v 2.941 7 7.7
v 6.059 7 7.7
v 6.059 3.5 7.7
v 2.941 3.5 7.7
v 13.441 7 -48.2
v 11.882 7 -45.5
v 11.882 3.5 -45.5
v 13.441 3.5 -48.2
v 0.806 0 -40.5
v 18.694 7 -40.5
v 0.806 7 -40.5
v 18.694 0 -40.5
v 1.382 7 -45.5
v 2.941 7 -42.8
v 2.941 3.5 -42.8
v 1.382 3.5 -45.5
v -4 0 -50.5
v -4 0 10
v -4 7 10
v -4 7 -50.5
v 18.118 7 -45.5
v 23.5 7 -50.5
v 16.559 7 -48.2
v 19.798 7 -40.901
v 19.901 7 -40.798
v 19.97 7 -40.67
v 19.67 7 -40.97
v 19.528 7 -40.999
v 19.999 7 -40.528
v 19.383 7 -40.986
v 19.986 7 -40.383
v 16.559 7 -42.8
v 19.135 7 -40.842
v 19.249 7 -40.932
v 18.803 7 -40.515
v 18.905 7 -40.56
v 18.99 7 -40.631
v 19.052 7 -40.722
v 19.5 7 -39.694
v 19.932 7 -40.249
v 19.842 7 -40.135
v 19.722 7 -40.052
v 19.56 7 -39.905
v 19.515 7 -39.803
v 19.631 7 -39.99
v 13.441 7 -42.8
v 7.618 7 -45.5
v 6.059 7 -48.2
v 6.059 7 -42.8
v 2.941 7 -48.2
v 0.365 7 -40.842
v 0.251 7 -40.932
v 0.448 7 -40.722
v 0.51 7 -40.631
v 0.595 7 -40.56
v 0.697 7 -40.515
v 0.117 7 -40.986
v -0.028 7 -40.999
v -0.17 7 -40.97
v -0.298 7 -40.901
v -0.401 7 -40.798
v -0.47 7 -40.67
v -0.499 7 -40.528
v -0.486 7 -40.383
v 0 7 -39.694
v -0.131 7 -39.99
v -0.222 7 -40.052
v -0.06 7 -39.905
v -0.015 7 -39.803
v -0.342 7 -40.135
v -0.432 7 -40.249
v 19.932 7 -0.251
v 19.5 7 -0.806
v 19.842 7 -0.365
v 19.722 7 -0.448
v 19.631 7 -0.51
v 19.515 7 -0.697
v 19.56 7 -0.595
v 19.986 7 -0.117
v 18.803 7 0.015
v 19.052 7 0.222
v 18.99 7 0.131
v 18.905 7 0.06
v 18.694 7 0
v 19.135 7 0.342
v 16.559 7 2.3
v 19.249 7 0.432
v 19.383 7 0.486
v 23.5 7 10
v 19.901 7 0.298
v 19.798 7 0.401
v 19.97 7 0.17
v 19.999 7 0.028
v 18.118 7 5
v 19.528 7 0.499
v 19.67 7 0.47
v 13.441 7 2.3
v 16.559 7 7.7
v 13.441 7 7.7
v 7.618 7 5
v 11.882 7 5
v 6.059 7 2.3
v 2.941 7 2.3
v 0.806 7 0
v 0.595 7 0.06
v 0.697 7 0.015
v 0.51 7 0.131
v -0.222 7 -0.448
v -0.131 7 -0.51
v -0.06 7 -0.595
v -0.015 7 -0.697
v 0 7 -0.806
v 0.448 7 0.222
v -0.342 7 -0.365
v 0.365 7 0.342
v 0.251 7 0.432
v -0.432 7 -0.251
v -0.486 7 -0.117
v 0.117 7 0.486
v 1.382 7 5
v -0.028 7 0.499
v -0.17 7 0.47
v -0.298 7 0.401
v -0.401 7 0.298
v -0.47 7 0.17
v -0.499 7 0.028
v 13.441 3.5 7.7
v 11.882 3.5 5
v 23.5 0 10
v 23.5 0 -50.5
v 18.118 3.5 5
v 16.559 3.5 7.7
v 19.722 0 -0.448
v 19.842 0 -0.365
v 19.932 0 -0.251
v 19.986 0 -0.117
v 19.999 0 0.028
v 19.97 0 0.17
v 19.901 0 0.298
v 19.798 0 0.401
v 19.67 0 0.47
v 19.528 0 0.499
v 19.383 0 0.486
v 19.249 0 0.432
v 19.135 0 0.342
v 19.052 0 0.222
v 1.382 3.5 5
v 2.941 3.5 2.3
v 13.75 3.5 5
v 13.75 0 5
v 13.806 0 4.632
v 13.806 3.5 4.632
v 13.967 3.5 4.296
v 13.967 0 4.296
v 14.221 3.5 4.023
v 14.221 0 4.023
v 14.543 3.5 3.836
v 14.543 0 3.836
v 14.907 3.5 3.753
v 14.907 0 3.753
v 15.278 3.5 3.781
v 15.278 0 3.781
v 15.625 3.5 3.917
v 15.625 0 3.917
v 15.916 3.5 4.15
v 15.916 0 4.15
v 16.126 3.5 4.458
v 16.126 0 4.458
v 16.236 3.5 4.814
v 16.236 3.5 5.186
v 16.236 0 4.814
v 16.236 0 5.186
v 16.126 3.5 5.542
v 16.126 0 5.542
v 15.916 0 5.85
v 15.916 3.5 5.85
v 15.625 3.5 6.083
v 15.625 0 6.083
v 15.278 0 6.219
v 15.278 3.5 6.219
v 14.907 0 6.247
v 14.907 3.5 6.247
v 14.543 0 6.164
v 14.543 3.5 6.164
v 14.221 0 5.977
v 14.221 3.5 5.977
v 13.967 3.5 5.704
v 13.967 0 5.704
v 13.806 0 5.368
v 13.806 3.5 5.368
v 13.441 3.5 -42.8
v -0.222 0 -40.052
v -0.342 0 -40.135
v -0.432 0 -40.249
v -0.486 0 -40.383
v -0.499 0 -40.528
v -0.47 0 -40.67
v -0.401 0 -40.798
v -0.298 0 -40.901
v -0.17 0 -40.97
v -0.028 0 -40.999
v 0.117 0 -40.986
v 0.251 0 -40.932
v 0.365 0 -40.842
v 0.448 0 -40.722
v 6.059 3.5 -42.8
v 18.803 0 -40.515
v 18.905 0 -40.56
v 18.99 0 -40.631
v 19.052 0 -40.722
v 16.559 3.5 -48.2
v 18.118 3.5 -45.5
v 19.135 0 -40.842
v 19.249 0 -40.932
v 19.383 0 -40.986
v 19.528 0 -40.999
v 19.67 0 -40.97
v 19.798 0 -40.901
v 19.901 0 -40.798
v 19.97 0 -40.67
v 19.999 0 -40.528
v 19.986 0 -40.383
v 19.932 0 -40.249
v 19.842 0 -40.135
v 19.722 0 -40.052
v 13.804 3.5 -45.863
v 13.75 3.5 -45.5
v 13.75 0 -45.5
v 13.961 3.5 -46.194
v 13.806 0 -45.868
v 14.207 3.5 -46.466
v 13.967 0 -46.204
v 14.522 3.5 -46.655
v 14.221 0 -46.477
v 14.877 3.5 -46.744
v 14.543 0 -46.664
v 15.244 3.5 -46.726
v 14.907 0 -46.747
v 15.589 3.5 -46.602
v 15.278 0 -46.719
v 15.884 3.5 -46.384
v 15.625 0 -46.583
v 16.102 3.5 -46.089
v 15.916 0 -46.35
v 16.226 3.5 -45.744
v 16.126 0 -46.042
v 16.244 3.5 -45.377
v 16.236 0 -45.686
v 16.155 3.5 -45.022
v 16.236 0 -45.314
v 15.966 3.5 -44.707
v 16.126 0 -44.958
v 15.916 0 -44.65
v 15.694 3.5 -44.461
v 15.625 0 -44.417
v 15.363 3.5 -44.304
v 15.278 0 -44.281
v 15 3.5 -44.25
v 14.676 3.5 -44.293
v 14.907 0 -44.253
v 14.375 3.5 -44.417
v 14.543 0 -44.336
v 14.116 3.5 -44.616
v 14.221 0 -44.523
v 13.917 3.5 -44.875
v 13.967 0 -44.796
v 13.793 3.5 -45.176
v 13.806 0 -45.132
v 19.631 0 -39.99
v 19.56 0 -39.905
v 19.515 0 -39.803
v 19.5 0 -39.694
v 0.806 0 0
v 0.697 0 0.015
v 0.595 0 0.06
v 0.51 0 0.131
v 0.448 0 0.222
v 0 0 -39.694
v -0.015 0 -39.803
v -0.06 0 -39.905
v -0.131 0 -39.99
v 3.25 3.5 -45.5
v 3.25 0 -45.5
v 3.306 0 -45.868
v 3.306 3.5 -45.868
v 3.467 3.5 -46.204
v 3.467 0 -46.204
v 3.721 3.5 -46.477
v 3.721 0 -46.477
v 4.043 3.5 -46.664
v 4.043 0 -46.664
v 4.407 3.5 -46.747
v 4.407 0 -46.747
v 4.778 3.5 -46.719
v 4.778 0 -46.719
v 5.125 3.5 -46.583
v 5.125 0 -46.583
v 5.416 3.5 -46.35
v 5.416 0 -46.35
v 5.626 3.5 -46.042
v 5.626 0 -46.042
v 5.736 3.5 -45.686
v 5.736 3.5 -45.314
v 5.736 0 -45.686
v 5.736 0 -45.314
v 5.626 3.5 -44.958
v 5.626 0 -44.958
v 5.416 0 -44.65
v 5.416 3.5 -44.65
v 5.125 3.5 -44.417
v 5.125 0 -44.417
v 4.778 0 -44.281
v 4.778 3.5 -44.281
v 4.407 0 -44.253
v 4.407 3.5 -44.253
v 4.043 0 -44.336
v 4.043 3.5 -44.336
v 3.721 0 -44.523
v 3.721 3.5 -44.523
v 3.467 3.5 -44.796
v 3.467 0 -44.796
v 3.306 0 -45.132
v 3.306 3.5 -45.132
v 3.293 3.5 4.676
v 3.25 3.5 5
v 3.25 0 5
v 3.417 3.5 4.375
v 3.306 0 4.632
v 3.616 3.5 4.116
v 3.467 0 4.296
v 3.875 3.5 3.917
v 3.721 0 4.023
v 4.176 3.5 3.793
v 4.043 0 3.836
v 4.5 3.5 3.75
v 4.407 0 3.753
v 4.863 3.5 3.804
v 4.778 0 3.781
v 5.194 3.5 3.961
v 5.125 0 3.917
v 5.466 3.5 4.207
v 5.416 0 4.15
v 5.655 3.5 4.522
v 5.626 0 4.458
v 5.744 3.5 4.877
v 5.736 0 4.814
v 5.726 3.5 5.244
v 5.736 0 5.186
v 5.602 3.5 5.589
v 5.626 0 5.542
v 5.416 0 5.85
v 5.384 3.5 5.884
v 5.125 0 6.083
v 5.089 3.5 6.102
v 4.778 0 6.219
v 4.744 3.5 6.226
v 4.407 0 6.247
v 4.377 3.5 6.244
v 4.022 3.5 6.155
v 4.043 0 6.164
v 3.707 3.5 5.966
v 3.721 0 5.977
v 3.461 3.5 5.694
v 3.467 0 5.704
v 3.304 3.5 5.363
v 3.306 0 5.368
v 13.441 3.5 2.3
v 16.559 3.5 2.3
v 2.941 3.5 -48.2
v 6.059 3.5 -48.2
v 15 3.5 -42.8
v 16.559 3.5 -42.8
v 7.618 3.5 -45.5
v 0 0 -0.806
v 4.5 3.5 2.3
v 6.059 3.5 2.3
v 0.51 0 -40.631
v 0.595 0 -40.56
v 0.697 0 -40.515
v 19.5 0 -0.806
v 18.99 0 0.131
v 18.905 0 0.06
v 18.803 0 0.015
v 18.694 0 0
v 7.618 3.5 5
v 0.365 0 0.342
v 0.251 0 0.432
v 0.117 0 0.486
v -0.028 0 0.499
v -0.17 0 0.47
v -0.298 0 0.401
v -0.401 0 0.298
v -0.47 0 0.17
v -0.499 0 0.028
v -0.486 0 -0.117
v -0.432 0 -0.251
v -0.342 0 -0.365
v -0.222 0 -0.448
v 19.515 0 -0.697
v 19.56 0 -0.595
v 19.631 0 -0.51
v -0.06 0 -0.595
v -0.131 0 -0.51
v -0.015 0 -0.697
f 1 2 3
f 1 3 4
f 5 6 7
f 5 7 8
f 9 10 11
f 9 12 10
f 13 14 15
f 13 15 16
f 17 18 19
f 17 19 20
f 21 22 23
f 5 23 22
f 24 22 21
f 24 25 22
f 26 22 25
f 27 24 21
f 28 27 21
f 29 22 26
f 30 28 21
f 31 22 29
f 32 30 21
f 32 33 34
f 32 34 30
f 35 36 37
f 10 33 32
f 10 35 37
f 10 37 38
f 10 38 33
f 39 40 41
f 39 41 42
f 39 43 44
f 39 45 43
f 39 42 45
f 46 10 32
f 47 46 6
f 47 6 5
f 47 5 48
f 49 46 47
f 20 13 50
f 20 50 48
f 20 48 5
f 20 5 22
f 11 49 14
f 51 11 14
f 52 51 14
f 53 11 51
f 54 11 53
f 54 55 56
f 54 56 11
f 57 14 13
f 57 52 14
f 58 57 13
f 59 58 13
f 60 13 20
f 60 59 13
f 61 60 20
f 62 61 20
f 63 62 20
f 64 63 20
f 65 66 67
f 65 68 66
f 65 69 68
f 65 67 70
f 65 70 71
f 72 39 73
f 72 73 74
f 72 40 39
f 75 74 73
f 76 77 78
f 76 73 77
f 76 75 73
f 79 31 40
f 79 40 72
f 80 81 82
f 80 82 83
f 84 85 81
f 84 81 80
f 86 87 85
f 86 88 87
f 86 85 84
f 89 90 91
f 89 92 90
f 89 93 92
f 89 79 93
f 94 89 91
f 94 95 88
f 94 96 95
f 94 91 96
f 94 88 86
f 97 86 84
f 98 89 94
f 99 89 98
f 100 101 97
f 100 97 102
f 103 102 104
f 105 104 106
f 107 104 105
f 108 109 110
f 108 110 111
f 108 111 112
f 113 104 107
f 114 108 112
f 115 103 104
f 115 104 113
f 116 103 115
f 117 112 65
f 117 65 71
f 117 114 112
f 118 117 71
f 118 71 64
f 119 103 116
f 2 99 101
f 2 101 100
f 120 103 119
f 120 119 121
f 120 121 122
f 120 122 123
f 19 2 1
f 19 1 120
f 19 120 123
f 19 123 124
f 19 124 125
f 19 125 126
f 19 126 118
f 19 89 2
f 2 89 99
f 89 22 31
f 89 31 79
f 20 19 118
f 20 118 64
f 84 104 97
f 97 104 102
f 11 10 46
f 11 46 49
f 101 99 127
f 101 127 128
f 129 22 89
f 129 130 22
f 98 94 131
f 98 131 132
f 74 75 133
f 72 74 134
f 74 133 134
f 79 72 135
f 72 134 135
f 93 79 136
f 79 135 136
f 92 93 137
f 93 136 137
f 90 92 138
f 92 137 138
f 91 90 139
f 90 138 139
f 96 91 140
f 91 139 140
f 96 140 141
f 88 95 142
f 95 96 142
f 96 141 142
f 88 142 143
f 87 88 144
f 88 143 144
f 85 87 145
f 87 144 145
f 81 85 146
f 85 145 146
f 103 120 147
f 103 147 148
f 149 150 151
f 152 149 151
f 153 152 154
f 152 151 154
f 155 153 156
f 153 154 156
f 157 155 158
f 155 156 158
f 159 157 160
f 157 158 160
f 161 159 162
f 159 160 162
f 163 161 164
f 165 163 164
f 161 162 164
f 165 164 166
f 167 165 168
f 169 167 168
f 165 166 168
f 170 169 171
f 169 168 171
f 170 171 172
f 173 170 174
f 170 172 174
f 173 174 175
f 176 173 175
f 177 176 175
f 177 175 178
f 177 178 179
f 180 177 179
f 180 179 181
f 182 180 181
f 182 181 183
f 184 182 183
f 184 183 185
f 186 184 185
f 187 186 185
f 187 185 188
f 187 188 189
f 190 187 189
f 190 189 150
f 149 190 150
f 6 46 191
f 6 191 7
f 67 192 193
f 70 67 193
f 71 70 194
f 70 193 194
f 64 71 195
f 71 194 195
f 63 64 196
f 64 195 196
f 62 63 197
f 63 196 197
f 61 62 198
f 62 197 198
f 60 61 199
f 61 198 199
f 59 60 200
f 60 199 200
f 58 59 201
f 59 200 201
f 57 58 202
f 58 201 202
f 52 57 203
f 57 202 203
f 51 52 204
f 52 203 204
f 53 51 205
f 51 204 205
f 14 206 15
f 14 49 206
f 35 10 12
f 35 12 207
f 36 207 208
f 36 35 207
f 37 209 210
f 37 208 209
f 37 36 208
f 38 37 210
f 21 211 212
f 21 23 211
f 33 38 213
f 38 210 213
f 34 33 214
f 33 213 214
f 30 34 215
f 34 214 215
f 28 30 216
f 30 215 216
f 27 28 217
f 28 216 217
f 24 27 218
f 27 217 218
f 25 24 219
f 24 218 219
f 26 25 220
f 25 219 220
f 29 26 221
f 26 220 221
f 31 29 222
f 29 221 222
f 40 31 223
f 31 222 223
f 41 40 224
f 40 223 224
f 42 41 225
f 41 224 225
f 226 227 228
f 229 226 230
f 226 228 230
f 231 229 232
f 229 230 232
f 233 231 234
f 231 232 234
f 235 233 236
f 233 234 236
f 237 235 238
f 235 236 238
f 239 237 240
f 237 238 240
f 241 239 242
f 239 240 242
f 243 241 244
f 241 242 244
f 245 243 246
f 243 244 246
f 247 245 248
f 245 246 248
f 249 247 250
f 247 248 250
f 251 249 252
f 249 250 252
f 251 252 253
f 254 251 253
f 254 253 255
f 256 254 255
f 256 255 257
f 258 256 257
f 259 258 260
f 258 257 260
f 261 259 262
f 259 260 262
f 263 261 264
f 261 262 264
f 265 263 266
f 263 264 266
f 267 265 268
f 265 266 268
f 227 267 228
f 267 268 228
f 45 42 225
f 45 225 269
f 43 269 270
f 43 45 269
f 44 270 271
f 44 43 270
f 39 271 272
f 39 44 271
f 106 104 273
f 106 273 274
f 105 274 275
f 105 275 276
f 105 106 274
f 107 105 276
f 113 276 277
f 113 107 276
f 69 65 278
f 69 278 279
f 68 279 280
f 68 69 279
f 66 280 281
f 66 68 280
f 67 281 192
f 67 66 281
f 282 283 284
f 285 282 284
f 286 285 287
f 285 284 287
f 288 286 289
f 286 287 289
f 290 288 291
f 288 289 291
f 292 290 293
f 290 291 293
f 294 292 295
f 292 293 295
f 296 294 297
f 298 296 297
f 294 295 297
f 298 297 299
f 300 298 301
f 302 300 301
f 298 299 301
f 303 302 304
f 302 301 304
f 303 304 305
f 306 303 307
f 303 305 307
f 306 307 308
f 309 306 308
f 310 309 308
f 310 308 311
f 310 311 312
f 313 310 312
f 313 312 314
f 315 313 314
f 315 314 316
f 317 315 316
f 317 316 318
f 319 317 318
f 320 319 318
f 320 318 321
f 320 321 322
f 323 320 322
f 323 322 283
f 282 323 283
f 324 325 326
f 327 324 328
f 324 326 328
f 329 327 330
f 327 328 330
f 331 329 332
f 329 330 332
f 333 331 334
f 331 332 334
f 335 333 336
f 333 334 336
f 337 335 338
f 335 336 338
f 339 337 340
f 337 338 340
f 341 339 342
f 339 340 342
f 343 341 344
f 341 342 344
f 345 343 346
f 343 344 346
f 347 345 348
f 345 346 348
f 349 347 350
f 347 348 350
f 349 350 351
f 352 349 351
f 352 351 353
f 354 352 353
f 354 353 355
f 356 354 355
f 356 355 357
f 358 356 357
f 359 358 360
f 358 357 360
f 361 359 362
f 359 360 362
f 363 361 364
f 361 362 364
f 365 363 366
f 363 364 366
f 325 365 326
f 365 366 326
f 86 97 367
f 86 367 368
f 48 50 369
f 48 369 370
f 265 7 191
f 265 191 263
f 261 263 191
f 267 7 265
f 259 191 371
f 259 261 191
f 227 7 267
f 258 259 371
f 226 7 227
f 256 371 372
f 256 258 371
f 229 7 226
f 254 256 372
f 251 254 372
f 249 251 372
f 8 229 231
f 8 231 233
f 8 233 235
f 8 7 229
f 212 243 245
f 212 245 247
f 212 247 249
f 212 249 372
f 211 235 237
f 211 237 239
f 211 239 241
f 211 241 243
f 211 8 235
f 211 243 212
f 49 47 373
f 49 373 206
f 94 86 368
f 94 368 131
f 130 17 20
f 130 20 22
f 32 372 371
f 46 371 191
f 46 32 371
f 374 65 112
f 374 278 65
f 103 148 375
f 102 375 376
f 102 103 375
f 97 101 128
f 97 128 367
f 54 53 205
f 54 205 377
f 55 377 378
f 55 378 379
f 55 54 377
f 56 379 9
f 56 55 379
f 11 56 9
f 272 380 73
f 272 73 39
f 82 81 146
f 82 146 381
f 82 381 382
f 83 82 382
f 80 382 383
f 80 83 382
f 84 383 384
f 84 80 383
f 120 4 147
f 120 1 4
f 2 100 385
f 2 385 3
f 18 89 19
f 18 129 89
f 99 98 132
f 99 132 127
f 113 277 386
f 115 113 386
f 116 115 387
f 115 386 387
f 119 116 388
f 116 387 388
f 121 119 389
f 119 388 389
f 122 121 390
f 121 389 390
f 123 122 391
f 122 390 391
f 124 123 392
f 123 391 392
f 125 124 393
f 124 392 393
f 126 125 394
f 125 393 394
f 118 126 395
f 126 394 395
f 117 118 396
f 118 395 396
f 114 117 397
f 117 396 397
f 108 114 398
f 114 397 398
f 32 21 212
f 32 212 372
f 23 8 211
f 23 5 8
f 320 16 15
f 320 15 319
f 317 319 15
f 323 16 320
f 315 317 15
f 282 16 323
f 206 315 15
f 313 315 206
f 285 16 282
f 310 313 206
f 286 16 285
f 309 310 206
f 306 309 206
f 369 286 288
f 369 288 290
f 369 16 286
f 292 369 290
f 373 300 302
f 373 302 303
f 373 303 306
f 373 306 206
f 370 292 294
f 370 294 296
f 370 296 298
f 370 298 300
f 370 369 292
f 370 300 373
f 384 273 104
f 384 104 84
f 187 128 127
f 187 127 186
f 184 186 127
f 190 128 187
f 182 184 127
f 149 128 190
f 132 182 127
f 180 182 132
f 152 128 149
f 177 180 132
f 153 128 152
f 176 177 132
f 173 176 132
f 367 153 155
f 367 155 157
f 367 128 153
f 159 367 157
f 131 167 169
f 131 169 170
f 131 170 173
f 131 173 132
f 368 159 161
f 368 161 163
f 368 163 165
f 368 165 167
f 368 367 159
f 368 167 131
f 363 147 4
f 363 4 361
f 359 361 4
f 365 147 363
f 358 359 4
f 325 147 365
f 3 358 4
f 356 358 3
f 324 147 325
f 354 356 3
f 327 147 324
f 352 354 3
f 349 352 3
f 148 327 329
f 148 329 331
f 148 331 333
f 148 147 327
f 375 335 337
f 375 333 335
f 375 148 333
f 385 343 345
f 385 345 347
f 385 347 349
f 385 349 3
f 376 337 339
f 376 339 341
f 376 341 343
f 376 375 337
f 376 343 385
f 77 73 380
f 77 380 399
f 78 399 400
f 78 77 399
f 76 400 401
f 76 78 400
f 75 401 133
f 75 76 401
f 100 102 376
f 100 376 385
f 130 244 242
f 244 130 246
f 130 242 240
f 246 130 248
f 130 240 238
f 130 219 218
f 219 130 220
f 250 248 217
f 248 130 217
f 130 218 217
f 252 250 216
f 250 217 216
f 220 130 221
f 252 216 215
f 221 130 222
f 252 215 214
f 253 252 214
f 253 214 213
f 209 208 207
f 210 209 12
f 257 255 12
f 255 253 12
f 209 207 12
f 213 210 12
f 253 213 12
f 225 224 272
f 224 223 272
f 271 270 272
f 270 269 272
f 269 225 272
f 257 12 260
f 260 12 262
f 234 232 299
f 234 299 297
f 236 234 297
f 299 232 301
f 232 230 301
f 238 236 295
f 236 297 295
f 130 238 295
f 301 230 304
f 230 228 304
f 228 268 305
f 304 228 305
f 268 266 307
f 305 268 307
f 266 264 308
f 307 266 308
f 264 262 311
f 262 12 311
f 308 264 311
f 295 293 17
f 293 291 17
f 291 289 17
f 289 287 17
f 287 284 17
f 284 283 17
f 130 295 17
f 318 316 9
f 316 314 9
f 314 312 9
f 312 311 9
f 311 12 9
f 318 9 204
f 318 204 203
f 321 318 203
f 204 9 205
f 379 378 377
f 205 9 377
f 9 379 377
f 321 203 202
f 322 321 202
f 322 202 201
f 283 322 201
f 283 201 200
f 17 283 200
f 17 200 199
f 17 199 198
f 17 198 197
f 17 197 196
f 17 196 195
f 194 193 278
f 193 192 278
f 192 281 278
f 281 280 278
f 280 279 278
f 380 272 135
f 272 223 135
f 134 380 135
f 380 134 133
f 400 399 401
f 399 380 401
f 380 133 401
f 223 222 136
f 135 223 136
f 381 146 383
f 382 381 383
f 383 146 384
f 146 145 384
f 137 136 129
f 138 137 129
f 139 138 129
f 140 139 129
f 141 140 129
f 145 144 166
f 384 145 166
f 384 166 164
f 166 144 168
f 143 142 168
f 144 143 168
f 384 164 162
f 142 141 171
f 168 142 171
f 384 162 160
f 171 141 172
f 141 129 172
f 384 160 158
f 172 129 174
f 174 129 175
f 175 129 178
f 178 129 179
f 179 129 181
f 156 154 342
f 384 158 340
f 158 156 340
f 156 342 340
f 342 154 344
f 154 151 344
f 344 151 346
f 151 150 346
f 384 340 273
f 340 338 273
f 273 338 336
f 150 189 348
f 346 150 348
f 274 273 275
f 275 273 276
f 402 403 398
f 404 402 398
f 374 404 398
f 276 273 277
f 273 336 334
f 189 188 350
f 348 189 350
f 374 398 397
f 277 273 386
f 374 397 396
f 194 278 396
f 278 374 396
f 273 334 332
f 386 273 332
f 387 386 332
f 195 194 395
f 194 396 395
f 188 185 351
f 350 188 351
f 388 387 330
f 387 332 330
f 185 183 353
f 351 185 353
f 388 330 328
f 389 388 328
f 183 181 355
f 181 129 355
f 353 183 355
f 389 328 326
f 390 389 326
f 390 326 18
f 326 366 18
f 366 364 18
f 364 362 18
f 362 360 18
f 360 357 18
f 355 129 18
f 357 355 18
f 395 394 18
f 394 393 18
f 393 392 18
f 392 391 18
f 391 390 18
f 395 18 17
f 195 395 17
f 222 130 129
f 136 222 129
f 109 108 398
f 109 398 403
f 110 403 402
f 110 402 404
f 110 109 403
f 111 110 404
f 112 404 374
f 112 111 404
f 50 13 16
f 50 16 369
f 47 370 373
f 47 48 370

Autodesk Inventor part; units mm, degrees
ref_plane "YZ Plane" through (0, 0, 0) normal (1, 0, 0) x (0, 1, 0)
ref_plane "XZ Plane" through (0, 0, 0) normal (0, 1, 0) x (-1, 0, 0)
ref_plane "XY Plane" through (0, 0, 0) normal (0, 0, 1) x (1, 0, 0)
sketch "Эскиз1" plane through (0, 0, 0) normal (0, 1, 0) x (-1, 0, 0)
  line L0 (0, 0) -> (-19.5, 0)
  line L1 (-19.5, 0) -> (-19.5, -40.5)
  line L2 (-19.5, -40.5) -> (0, -40.5)
  line L3 (0, -40.5) -> (0, 0)
  line L4 (-19.5, -40.5) -> (-19.5, -45.5)
  line L5 (-19.5, -45.5) -> (-15, -45.5)
  line L6 (0, -45.5) -> (-4.5, -45.5)
  line L7 (-4.5, -45.5) -> (-15, -45.5)
  line L8 (0, -40.5) -> (-19.5, -40.5)
  line L9 (-19.5, -40.5) -> (-19.5, -50.5)
  line L10 (-19.5, -50.5) -> (0, -50.5)
  line L11 (0, -50.5) -> (0, -40.5)
  line L12 (0, 0) -> (-19.5, 0)
  line L13 (-19.5, 0) -> (-19.5, 10)
  line L14 (-19.5, 10) -> (0, 10)
  line L15 (0, 10) -> (0, 0)
  line L16 (0, 5) -> (-4.5, 5)
  line L17 (-4.5, 5) -> (-15, 5)
  line L18 (-15, 5) -> (-19.5, 5)
  line L19 (-19.5, -50.5) -> (-23.5, -50.5)
  line L20 (-23.5, -50.5) -> (-23.5, 10)
  line L21 (-23.5, 10) -> (-19.5, 10)
  line L22 (-19.5, 10) -> (-19.5, -50.5)
  line L23 (0, 10) -> (4, 10)
  line L24 (4, 10) -> (4, -50.5)
  line L25 (4, -50.5) -> (0, -50.5)
  line L26 (0, -50.5) -> (0, 10)
  circle A0 centre (-4.5, -45.5) radius 1.25
  circle A1 centre (-15, -45.5) radius 1.25
  circle A2 centre (-4.5, 5) radius 1.25
  circle A3 centre (-15, 5) radius 1.25
  circle A4 centre (0, -40.5) radius 0.5
  circle A5 centre (-19.5, -40.5) radius 0.5
  circle A6 centre (0, 0) radius 0.5
  circle A7 centre (-19.5, 0) radius 0.5
  point P0 (-19, 0)
  point P1 (-0.5, 0)
  point P2 (0, -0.5)
  point P3 (0, -40)
  point P4 (-0.5, -40.5)
  point P5 (-19, -40.5)
  point P6 (-19.5, -40)
  point P7 (-19.5, -0.5)
  dimension "d0" = 19.5
  dimension "d1" = 40.5
  dimension "d2" = 5
  dimension "d3" = 4.5
  dimension "d4" = 4.5
  dimension "d5" = 10
  dimension "d6" = 10
  dimension "d7" = 4
  dimension "d8" = 4
  dimension "d9" = 2.5
  dimension "d10" = 2.5
  dimension "d11" = 2.5
  dimension "d12" = 2.5
  dimension "d16" = 1
  dimension "d17" = 1
  dimension "d18" = 1
  dimension "d19" = 1
extrude "Выдавливание1" add sketch "Эскиз1" along normal blind 7 contours A7 L13 L18 A3 L17 A2 L16 L15 A6 L0 | A7 L1 A5 L4 L9 L19 L20 L21 L13 | L15 L23 L24 L25 L11 A4 L3 A6 | L13 L14 L15 L16 A2 L17 A3 L18 | L2 A4 L11 L6 A0 L7 A1 L5 L4 A5 | L5 A1 L7 A0 L6 L11 L10 L9
fillet "Сопряжение1" radius 0.4 8 edges at (0, 3.5, -0.5) (0.5, 3.5, 0) (0, 3.5, -40) (0.5, 3.5, -40.5) (19.5, 3.5, -40) (19, 3.5, -40.5) (19.5, 3.5, -0.5) (19, 3.5, 0)
sketch "Эскиз2" plane through (0, 7, 0) normal (0, 1, 0) x (1, 0, 0)
  circle A0 centre (4.5, -5) radius 1.25 projected
  line L0 (4.5, -5) -> (4.5, -2.3)
  circle A1 centre (15, 45.5) radius 1.25 projected
  line L1 (15, 45.5) -> (15, 42.8)
  line L2 (13.4412, 42.8) -> (11.8823, 45.5)
  line L3 (11.8823, 45.5) -> (13.4412, 48.2)
  line L4 (13.4412, 48.2) -> (16.5588, 48.2)
  line L5 (16.5588, 48.2) -> (18.1177, 45.5)
  line L6 (18.1177, 45.5) -> (16.5588, 42.8)
  line L7 (16.5588, 42.8) -> (13.4412, 42.8)
  circle A2 centre (4.5, 45.5) radius 1.25 projected
  line L8 (2.9412, 42.8) -> (1.3823, 45.5)
  line L9 (1.3823, 45.5) -> (2.9412, 48.2)
  line L10 (2.9412, 48.2) -> (6.0588, 48.2)
  line L11 (6.0588, 48.2) -> (7.6177, 45.5)
  line L12 (7.6177, 45.5) -> (6.0588, 42.8)
  line L13 (6.0588, 42.8) -> (2.9412, 42.8)
  line L14 (6.0588, -2.3) -> (7.6177, -5)
  line L15 (7.6177, -5) -> (6.0588, -7.7)
  line L16 (6.0588, -7.7) -> (2.9412, -7.7)
  line L17 (2.9412, -7.7) -> (1.3823, -5)
  line L18 (1.3823, -5) -> (2.9412, -2.3)
  line L19 (2.9412, -2.3) -> (6.0588, -2.3)
  circle A3 centre (15, -5) radius 1.25 projected
  line L20 (16.5588, -2.3) -> (18.1177, -5)
  line L21 (18.1177, -5) -> (16.5588, -7.7)
  line L22 (16.5588, -7.7) -> (13.4412, -7.7)
  line L23 (13.4412, -7.7) -> (11.8823, -5)
  line L24 (11.8823, -5) -> (13.4412, -2.3)
  line L25 (13.4412, -2.3) -> (16.5588, -2.3)
  point P0 (0, 0)
  point P1 (4.5, 42.8)
  point P2 (15, -2.3)
  dimension "d21" = 2.7
  dimension "d22" = 2.7
extrude "Выдавливание2" cut sketch "Эскиз2" against normal blind 3.5 contours A0 | L19 L14 L15 L16 L17 L18 | A1 | L7 L2 L3 L4 L5 L6 | A2 | L8 L9 L10 L11 L12 L13 | A3 | L20 L21 L22 L23 L24 L25
properties part number "vydacha"
